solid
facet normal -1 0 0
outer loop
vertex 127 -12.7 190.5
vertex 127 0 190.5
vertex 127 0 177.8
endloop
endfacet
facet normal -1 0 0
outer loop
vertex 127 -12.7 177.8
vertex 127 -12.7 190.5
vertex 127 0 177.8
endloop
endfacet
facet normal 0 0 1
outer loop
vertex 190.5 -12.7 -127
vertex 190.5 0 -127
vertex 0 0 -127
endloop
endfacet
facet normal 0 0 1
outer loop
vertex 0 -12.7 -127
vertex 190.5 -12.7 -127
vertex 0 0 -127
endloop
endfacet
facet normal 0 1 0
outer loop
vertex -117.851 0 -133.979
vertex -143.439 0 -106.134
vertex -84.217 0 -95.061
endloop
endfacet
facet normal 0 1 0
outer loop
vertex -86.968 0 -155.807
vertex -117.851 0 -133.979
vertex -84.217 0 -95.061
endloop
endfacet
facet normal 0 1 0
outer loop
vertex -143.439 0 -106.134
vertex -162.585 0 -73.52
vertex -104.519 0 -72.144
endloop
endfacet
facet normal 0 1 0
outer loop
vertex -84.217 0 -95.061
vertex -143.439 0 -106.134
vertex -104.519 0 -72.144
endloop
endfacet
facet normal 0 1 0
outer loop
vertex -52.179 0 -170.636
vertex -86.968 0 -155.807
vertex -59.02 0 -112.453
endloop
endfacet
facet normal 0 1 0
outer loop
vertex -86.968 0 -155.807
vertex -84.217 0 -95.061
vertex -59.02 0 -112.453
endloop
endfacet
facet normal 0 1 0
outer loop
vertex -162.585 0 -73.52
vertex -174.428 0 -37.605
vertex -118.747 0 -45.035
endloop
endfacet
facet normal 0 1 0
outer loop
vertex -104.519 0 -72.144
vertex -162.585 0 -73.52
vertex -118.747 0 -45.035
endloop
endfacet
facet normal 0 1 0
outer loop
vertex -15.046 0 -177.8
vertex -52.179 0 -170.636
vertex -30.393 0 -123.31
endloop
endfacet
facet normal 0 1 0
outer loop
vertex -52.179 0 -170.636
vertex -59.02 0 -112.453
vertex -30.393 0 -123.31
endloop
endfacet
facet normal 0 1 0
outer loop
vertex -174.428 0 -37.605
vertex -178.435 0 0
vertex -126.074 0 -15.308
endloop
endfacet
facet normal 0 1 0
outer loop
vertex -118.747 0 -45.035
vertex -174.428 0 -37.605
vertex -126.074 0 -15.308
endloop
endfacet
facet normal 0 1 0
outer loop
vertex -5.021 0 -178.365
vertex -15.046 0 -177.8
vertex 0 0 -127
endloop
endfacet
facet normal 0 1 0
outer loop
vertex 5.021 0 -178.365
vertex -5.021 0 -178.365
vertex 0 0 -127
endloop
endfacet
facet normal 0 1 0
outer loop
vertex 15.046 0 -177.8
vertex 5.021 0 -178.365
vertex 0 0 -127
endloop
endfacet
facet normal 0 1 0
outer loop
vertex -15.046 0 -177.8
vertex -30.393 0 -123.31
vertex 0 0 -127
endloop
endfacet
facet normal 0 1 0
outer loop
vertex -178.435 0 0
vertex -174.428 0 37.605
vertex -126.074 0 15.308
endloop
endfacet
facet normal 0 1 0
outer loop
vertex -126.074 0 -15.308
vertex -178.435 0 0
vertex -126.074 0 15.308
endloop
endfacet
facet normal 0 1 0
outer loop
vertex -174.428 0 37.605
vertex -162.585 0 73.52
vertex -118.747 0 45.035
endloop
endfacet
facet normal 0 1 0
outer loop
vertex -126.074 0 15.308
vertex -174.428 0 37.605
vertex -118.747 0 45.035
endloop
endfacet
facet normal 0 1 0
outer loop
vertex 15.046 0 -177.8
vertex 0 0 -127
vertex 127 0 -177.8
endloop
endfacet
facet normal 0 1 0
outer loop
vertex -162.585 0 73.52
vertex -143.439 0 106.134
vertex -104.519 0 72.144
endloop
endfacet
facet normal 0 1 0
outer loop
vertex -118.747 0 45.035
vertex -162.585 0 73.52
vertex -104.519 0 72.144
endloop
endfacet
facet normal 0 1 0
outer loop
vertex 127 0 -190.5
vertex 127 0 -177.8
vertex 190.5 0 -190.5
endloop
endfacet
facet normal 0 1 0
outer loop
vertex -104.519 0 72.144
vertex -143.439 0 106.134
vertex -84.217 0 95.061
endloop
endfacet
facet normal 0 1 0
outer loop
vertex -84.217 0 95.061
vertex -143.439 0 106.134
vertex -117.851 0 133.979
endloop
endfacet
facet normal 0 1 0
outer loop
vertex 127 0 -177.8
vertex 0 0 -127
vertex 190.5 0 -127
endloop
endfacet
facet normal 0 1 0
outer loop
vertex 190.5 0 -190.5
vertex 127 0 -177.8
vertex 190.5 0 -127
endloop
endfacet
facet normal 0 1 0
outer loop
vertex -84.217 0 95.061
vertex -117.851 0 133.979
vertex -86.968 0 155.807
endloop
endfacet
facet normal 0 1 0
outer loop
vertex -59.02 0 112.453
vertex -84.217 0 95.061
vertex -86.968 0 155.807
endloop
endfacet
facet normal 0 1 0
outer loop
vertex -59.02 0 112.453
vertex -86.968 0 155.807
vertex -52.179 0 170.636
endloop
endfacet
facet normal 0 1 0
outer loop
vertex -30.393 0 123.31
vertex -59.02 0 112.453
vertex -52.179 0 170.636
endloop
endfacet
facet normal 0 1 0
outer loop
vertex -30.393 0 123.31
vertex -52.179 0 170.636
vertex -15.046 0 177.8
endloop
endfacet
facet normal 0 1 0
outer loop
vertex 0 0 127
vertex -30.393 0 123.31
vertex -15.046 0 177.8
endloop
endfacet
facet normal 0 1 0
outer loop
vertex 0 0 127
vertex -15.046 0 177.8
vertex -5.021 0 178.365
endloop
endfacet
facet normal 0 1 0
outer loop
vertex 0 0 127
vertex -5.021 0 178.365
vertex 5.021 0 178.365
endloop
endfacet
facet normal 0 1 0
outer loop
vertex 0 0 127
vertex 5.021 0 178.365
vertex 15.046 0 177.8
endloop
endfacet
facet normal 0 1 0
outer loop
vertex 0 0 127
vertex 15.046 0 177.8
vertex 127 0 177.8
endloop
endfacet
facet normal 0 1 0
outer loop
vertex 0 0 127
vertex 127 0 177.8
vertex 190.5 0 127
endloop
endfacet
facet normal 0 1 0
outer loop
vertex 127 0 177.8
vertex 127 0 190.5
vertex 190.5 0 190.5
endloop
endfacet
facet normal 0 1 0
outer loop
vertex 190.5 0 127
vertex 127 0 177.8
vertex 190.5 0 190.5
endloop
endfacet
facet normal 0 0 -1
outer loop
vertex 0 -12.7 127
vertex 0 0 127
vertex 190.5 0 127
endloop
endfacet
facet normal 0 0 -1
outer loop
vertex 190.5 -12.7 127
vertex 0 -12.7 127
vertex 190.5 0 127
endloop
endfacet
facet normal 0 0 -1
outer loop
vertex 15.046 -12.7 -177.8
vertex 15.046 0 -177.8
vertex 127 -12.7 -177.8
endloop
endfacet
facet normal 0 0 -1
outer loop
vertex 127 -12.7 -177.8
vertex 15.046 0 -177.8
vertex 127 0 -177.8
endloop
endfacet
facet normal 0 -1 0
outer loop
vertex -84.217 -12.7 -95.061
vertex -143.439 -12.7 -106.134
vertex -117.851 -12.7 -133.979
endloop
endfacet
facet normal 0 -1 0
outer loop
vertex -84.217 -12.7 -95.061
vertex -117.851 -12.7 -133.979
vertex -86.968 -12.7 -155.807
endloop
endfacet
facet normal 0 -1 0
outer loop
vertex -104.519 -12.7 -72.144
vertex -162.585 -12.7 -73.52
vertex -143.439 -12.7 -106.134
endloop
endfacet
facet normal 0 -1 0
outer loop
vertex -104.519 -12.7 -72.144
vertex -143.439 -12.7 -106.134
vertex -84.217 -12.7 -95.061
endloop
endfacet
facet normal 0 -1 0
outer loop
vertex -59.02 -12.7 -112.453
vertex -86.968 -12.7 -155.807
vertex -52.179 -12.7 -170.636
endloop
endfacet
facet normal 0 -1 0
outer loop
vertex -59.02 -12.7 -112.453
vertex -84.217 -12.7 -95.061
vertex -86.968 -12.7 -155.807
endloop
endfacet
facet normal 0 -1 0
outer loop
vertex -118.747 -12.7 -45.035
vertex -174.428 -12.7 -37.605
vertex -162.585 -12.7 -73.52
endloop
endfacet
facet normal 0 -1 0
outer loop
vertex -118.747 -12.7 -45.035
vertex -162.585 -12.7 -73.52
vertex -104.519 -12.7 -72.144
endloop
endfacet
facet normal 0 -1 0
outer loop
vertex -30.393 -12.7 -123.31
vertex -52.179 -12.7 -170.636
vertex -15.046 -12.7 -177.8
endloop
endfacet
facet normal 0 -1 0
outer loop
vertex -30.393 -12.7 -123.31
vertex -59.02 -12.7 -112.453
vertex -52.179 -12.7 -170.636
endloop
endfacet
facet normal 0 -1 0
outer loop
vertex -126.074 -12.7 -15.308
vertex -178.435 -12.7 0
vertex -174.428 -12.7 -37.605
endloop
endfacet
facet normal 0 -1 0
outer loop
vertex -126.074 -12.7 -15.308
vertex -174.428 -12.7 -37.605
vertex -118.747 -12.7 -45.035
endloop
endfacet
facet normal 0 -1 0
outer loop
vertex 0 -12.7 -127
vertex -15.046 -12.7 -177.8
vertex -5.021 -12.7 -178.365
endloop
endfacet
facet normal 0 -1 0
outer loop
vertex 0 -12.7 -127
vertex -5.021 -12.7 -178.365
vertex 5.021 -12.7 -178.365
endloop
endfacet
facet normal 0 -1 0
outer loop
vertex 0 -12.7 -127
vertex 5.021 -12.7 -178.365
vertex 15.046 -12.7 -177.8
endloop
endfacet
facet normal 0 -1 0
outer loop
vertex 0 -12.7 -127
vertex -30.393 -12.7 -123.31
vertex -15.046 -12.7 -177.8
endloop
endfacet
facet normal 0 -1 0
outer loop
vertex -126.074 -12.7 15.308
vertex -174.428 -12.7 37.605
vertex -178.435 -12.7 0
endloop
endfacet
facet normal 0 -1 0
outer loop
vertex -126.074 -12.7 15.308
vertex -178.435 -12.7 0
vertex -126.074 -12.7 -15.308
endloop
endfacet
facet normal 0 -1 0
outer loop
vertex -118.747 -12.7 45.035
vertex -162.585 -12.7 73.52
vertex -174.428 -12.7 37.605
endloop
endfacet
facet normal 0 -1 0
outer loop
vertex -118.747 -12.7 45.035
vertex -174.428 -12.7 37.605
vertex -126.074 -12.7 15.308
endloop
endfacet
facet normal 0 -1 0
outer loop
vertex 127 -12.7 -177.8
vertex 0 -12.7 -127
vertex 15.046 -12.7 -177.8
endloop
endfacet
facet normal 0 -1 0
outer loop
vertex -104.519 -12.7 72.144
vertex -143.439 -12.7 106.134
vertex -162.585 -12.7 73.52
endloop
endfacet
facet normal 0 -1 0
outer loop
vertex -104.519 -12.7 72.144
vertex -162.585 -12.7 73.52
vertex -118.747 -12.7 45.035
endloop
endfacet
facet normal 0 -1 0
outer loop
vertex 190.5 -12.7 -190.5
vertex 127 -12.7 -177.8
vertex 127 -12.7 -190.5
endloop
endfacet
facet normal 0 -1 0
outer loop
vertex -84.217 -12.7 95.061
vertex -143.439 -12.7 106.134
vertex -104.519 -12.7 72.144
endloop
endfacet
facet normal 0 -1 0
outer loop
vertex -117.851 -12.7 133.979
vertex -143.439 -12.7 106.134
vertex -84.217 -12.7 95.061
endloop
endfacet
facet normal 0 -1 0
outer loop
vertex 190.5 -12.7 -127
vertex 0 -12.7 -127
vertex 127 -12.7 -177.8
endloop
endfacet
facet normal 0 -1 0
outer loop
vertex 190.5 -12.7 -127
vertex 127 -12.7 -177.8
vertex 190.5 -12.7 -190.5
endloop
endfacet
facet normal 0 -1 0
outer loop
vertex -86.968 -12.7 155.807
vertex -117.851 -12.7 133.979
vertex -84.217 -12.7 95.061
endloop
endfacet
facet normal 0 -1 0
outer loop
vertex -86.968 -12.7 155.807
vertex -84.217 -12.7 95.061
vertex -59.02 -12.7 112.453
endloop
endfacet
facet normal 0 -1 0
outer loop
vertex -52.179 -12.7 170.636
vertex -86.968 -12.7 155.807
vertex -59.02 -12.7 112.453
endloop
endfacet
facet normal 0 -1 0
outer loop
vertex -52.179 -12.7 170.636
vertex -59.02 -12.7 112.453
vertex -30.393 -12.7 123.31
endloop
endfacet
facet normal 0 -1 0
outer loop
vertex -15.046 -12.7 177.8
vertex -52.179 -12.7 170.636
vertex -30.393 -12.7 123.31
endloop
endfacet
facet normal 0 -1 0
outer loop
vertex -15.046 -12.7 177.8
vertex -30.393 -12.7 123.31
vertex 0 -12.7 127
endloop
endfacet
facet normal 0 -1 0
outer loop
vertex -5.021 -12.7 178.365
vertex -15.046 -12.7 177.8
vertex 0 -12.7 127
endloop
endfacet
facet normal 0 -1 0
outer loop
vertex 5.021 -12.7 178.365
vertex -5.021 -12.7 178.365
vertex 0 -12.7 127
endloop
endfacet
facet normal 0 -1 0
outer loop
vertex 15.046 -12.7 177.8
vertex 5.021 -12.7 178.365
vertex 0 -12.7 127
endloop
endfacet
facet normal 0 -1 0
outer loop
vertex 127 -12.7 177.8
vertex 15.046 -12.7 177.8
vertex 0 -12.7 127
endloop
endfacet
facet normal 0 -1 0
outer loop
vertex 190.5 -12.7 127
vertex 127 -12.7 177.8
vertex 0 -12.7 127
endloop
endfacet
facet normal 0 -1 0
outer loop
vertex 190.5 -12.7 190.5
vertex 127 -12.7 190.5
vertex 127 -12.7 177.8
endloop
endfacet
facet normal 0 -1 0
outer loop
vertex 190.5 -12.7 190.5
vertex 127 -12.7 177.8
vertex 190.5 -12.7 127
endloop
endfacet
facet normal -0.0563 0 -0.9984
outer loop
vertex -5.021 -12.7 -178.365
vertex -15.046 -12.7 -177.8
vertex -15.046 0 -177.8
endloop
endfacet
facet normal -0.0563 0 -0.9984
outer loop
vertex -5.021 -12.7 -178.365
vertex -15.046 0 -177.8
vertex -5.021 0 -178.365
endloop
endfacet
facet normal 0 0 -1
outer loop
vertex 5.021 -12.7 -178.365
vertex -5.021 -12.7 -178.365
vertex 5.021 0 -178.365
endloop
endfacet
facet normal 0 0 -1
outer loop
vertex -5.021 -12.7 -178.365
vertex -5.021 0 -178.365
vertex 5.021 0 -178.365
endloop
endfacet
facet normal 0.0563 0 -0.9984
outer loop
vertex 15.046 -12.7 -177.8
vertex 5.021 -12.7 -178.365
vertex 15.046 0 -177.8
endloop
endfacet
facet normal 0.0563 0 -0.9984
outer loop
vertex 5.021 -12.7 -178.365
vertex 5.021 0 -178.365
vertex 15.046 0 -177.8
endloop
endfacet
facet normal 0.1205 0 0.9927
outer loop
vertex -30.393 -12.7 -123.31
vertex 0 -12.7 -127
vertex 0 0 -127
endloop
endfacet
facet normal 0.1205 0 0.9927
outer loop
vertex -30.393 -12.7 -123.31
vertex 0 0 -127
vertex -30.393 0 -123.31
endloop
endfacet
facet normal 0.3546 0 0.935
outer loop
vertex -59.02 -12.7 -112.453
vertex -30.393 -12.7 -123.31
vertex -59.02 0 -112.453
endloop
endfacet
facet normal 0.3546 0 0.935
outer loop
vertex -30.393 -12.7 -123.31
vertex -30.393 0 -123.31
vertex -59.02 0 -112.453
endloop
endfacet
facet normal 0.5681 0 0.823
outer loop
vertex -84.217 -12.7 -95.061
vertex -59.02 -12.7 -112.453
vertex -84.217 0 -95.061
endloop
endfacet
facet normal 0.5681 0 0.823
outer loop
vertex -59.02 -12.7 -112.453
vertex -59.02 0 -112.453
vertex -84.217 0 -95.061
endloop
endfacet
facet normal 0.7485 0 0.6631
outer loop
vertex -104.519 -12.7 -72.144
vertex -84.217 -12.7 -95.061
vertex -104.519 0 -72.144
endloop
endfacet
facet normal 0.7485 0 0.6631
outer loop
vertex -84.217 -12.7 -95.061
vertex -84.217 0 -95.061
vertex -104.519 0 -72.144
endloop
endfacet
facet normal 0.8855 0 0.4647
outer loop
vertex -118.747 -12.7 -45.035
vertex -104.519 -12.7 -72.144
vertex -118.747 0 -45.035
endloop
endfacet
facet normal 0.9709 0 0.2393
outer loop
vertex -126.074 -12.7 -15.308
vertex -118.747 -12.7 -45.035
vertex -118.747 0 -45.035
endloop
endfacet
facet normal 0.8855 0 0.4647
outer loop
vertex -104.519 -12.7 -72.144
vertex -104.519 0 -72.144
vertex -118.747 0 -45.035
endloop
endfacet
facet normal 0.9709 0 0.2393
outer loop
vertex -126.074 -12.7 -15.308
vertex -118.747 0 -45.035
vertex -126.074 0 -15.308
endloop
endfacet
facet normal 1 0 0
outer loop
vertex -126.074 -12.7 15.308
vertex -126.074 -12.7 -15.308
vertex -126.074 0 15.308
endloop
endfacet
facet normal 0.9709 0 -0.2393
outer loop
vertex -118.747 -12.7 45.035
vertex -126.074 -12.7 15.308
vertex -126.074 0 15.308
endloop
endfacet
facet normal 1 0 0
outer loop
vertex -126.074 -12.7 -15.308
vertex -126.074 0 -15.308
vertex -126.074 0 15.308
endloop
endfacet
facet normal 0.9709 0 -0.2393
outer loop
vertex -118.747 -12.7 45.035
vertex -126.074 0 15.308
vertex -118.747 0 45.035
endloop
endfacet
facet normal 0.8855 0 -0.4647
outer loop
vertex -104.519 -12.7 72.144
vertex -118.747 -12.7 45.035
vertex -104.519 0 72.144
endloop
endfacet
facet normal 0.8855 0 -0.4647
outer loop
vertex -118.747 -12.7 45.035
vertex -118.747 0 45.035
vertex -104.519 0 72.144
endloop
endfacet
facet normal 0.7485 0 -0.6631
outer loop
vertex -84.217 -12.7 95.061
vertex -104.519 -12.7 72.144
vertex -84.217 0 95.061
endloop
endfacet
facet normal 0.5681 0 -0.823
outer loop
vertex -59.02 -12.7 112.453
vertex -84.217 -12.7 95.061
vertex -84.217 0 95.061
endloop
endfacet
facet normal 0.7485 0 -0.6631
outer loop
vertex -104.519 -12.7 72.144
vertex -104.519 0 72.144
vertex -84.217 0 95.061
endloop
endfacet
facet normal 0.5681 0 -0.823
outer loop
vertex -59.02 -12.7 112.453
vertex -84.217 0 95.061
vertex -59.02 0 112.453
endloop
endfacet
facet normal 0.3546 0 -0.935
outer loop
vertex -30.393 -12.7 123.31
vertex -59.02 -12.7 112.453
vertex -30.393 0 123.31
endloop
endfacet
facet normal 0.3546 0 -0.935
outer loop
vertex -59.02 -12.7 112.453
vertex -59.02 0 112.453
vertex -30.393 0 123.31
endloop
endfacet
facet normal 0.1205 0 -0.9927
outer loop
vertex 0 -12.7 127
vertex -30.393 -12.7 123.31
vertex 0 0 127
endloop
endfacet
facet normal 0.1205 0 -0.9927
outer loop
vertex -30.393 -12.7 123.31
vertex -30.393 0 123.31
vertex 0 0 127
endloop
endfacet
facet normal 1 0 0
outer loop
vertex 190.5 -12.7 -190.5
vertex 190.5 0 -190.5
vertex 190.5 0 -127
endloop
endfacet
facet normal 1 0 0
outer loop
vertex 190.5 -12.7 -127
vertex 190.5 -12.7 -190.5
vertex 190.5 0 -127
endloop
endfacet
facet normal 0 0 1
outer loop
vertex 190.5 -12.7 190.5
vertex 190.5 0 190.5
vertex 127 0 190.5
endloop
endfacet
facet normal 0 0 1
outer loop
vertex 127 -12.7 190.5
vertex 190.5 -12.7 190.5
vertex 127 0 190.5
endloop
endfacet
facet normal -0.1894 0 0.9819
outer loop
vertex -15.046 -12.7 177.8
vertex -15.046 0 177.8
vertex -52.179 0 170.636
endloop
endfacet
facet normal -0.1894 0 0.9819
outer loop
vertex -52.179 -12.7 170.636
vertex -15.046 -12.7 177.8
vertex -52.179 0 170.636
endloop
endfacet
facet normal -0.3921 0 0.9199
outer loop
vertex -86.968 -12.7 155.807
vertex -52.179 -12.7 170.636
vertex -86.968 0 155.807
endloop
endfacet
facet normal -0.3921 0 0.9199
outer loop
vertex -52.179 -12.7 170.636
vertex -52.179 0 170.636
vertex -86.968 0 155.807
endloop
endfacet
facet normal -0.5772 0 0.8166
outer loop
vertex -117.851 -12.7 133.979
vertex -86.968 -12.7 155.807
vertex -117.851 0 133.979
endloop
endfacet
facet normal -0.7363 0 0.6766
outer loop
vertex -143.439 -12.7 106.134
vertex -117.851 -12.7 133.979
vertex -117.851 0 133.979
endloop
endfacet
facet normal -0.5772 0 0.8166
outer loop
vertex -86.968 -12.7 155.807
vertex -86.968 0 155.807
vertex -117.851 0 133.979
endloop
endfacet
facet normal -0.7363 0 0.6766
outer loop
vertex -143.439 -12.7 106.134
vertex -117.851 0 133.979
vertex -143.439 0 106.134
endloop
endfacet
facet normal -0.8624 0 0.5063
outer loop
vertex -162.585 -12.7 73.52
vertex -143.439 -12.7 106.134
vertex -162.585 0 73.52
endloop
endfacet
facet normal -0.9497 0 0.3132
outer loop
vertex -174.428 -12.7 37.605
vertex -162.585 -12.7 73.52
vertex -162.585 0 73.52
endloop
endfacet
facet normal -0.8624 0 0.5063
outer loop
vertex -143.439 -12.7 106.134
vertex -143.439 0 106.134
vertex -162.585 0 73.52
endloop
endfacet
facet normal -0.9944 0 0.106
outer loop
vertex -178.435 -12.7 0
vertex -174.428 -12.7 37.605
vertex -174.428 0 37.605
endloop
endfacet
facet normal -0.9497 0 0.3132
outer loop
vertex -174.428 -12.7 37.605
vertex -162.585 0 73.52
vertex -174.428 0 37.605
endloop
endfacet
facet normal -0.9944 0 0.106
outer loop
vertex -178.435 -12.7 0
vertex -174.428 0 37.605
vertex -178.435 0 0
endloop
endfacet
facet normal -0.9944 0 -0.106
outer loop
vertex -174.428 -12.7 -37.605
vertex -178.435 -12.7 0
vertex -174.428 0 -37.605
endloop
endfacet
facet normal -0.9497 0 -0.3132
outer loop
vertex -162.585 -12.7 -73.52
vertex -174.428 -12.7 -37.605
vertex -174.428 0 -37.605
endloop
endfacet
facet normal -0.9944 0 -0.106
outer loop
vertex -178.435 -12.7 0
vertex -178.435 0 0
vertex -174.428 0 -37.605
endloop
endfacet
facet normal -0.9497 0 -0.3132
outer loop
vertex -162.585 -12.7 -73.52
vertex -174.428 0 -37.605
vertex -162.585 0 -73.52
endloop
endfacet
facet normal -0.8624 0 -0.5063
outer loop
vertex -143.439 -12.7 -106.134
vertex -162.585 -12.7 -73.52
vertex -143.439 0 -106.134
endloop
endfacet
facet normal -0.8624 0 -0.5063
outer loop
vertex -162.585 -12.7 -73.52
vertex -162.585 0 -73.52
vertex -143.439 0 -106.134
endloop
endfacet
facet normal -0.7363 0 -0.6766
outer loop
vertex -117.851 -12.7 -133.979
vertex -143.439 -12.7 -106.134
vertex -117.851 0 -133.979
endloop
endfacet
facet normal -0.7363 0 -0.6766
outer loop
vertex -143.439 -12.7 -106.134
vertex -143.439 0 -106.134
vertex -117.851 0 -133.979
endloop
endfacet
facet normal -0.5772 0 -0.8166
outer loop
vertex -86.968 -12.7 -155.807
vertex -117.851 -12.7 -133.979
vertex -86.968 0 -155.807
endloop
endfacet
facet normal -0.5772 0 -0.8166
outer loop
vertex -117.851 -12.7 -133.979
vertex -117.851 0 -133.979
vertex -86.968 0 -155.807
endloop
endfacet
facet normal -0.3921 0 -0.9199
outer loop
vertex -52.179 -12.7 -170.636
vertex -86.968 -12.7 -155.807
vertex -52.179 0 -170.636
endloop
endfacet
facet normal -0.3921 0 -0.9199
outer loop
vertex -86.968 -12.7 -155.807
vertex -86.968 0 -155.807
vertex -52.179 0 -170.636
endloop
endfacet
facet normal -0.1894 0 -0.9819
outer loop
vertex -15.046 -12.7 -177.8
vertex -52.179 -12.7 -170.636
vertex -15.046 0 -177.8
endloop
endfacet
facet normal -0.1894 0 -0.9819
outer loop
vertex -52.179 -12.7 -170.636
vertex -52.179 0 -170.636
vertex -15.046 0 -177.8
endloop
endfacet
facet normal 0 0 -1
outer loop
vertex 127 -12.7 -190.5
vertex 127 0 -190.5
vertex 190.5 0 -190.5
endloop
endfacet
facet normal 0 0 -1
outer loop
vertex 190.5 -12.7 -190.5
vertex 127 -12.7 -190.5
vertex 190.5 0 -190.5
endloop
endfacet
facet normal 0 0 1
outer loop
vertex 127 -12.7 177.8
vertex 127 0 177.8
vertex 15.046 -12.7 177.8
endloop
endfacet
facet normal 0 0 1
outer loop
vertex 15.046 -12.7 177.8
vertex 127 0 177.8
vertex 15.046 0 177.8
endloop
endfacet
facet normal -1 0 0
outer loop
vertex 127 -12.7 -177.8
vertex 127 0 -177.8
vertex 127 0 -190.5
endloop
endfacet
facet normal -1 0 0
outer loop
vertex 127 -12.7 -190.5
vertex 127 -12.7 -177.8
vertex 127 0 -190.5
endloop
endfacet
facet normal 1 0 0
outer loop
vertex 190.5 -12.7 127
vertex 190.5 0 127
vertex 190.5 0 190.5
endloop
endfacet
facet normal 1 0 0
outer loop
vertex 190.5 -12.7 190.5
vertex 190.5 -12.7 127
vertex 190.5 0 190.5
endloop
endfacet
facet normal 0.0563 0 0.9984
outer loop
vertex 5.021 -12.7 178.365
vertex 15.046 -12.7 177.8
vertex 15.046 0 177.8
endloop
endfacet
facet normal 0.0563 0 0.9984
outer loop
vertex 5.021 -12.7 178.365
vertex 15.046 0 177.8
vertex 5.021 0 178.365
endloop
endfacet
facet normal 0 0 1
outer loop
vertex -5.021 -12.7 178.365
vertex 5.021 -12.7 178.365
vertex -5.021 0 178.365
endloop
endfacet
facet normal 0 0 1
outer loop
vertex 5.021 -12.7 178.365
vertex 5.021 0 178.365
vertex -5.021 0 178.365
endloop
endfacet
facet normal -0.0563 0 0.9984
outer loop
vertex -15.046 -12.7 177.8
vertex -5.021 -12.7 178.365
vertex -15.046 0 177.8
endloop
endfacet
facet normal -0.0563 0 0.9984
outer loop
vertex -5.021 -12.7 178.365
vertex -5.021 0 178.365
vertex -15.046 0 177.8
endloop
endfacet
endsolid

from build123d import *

# Parameters (mm, degrees)
F1_DEPTH = 12.7


with BuildPart() as f1:
    # F0 (on Front) → F1 (new body)
    with BuildSketch(Plane.XZ):
        with BuildLine():
            Line((127, 190.5), (127, 177.8))
            Line((127, 177.8), (15.045787, 177.8))
            Line((15.045787, 177.8), (-15.045787, 177.8))
            ThreePointArc((-15.045787, 177.8), (-178.435466, 0), (-15.045787, -177.8))
            Line((-15.045787, -177.8), (15.045787, -177.8))
            Line((15.045787, -177.8), (127, -177.8))
            Line((127, -177.8), (127, -190.5))
            Line((127, -190.5), (190.5, -190.5))
            Line((190.5, -190.5), (190.5, -177.8))
            Line((190.5, -177.8), (190.5, -127))
            Line((190.5, -127), (127, -127))
            Line((127, -127), (0, -127))
            ThreePointArc((0, -127), (-127, 0), (0, 127))
            Line((0, 127), (127, 127))
            Line((127, 127), (190.5, 127))
            Line((190.5, 127), (190.5, 177.8))
            Line((190.5, 177.8), (190.5, 190.5))
            Line((190.5, 190.5), (127, 190.5))
        make_face()
        with BuildLine():
            Line((-15.045787, 177.8), (15.045787, 177.8))
            ThreePointArc((15.045787, 177.8), (0, 178.435466), (-15.045787, 177.8))
        make_face()
        with BuildLine():
            Line((15.045787, -177.8), (-15.045787, -177.8))
            ThreePointArc((-15.045787, -177.8), (0, -178.435466), (15.045787, -177.8))
        make_face()
    extrude(amount=F1_DEPTH)


solid = f1.part
